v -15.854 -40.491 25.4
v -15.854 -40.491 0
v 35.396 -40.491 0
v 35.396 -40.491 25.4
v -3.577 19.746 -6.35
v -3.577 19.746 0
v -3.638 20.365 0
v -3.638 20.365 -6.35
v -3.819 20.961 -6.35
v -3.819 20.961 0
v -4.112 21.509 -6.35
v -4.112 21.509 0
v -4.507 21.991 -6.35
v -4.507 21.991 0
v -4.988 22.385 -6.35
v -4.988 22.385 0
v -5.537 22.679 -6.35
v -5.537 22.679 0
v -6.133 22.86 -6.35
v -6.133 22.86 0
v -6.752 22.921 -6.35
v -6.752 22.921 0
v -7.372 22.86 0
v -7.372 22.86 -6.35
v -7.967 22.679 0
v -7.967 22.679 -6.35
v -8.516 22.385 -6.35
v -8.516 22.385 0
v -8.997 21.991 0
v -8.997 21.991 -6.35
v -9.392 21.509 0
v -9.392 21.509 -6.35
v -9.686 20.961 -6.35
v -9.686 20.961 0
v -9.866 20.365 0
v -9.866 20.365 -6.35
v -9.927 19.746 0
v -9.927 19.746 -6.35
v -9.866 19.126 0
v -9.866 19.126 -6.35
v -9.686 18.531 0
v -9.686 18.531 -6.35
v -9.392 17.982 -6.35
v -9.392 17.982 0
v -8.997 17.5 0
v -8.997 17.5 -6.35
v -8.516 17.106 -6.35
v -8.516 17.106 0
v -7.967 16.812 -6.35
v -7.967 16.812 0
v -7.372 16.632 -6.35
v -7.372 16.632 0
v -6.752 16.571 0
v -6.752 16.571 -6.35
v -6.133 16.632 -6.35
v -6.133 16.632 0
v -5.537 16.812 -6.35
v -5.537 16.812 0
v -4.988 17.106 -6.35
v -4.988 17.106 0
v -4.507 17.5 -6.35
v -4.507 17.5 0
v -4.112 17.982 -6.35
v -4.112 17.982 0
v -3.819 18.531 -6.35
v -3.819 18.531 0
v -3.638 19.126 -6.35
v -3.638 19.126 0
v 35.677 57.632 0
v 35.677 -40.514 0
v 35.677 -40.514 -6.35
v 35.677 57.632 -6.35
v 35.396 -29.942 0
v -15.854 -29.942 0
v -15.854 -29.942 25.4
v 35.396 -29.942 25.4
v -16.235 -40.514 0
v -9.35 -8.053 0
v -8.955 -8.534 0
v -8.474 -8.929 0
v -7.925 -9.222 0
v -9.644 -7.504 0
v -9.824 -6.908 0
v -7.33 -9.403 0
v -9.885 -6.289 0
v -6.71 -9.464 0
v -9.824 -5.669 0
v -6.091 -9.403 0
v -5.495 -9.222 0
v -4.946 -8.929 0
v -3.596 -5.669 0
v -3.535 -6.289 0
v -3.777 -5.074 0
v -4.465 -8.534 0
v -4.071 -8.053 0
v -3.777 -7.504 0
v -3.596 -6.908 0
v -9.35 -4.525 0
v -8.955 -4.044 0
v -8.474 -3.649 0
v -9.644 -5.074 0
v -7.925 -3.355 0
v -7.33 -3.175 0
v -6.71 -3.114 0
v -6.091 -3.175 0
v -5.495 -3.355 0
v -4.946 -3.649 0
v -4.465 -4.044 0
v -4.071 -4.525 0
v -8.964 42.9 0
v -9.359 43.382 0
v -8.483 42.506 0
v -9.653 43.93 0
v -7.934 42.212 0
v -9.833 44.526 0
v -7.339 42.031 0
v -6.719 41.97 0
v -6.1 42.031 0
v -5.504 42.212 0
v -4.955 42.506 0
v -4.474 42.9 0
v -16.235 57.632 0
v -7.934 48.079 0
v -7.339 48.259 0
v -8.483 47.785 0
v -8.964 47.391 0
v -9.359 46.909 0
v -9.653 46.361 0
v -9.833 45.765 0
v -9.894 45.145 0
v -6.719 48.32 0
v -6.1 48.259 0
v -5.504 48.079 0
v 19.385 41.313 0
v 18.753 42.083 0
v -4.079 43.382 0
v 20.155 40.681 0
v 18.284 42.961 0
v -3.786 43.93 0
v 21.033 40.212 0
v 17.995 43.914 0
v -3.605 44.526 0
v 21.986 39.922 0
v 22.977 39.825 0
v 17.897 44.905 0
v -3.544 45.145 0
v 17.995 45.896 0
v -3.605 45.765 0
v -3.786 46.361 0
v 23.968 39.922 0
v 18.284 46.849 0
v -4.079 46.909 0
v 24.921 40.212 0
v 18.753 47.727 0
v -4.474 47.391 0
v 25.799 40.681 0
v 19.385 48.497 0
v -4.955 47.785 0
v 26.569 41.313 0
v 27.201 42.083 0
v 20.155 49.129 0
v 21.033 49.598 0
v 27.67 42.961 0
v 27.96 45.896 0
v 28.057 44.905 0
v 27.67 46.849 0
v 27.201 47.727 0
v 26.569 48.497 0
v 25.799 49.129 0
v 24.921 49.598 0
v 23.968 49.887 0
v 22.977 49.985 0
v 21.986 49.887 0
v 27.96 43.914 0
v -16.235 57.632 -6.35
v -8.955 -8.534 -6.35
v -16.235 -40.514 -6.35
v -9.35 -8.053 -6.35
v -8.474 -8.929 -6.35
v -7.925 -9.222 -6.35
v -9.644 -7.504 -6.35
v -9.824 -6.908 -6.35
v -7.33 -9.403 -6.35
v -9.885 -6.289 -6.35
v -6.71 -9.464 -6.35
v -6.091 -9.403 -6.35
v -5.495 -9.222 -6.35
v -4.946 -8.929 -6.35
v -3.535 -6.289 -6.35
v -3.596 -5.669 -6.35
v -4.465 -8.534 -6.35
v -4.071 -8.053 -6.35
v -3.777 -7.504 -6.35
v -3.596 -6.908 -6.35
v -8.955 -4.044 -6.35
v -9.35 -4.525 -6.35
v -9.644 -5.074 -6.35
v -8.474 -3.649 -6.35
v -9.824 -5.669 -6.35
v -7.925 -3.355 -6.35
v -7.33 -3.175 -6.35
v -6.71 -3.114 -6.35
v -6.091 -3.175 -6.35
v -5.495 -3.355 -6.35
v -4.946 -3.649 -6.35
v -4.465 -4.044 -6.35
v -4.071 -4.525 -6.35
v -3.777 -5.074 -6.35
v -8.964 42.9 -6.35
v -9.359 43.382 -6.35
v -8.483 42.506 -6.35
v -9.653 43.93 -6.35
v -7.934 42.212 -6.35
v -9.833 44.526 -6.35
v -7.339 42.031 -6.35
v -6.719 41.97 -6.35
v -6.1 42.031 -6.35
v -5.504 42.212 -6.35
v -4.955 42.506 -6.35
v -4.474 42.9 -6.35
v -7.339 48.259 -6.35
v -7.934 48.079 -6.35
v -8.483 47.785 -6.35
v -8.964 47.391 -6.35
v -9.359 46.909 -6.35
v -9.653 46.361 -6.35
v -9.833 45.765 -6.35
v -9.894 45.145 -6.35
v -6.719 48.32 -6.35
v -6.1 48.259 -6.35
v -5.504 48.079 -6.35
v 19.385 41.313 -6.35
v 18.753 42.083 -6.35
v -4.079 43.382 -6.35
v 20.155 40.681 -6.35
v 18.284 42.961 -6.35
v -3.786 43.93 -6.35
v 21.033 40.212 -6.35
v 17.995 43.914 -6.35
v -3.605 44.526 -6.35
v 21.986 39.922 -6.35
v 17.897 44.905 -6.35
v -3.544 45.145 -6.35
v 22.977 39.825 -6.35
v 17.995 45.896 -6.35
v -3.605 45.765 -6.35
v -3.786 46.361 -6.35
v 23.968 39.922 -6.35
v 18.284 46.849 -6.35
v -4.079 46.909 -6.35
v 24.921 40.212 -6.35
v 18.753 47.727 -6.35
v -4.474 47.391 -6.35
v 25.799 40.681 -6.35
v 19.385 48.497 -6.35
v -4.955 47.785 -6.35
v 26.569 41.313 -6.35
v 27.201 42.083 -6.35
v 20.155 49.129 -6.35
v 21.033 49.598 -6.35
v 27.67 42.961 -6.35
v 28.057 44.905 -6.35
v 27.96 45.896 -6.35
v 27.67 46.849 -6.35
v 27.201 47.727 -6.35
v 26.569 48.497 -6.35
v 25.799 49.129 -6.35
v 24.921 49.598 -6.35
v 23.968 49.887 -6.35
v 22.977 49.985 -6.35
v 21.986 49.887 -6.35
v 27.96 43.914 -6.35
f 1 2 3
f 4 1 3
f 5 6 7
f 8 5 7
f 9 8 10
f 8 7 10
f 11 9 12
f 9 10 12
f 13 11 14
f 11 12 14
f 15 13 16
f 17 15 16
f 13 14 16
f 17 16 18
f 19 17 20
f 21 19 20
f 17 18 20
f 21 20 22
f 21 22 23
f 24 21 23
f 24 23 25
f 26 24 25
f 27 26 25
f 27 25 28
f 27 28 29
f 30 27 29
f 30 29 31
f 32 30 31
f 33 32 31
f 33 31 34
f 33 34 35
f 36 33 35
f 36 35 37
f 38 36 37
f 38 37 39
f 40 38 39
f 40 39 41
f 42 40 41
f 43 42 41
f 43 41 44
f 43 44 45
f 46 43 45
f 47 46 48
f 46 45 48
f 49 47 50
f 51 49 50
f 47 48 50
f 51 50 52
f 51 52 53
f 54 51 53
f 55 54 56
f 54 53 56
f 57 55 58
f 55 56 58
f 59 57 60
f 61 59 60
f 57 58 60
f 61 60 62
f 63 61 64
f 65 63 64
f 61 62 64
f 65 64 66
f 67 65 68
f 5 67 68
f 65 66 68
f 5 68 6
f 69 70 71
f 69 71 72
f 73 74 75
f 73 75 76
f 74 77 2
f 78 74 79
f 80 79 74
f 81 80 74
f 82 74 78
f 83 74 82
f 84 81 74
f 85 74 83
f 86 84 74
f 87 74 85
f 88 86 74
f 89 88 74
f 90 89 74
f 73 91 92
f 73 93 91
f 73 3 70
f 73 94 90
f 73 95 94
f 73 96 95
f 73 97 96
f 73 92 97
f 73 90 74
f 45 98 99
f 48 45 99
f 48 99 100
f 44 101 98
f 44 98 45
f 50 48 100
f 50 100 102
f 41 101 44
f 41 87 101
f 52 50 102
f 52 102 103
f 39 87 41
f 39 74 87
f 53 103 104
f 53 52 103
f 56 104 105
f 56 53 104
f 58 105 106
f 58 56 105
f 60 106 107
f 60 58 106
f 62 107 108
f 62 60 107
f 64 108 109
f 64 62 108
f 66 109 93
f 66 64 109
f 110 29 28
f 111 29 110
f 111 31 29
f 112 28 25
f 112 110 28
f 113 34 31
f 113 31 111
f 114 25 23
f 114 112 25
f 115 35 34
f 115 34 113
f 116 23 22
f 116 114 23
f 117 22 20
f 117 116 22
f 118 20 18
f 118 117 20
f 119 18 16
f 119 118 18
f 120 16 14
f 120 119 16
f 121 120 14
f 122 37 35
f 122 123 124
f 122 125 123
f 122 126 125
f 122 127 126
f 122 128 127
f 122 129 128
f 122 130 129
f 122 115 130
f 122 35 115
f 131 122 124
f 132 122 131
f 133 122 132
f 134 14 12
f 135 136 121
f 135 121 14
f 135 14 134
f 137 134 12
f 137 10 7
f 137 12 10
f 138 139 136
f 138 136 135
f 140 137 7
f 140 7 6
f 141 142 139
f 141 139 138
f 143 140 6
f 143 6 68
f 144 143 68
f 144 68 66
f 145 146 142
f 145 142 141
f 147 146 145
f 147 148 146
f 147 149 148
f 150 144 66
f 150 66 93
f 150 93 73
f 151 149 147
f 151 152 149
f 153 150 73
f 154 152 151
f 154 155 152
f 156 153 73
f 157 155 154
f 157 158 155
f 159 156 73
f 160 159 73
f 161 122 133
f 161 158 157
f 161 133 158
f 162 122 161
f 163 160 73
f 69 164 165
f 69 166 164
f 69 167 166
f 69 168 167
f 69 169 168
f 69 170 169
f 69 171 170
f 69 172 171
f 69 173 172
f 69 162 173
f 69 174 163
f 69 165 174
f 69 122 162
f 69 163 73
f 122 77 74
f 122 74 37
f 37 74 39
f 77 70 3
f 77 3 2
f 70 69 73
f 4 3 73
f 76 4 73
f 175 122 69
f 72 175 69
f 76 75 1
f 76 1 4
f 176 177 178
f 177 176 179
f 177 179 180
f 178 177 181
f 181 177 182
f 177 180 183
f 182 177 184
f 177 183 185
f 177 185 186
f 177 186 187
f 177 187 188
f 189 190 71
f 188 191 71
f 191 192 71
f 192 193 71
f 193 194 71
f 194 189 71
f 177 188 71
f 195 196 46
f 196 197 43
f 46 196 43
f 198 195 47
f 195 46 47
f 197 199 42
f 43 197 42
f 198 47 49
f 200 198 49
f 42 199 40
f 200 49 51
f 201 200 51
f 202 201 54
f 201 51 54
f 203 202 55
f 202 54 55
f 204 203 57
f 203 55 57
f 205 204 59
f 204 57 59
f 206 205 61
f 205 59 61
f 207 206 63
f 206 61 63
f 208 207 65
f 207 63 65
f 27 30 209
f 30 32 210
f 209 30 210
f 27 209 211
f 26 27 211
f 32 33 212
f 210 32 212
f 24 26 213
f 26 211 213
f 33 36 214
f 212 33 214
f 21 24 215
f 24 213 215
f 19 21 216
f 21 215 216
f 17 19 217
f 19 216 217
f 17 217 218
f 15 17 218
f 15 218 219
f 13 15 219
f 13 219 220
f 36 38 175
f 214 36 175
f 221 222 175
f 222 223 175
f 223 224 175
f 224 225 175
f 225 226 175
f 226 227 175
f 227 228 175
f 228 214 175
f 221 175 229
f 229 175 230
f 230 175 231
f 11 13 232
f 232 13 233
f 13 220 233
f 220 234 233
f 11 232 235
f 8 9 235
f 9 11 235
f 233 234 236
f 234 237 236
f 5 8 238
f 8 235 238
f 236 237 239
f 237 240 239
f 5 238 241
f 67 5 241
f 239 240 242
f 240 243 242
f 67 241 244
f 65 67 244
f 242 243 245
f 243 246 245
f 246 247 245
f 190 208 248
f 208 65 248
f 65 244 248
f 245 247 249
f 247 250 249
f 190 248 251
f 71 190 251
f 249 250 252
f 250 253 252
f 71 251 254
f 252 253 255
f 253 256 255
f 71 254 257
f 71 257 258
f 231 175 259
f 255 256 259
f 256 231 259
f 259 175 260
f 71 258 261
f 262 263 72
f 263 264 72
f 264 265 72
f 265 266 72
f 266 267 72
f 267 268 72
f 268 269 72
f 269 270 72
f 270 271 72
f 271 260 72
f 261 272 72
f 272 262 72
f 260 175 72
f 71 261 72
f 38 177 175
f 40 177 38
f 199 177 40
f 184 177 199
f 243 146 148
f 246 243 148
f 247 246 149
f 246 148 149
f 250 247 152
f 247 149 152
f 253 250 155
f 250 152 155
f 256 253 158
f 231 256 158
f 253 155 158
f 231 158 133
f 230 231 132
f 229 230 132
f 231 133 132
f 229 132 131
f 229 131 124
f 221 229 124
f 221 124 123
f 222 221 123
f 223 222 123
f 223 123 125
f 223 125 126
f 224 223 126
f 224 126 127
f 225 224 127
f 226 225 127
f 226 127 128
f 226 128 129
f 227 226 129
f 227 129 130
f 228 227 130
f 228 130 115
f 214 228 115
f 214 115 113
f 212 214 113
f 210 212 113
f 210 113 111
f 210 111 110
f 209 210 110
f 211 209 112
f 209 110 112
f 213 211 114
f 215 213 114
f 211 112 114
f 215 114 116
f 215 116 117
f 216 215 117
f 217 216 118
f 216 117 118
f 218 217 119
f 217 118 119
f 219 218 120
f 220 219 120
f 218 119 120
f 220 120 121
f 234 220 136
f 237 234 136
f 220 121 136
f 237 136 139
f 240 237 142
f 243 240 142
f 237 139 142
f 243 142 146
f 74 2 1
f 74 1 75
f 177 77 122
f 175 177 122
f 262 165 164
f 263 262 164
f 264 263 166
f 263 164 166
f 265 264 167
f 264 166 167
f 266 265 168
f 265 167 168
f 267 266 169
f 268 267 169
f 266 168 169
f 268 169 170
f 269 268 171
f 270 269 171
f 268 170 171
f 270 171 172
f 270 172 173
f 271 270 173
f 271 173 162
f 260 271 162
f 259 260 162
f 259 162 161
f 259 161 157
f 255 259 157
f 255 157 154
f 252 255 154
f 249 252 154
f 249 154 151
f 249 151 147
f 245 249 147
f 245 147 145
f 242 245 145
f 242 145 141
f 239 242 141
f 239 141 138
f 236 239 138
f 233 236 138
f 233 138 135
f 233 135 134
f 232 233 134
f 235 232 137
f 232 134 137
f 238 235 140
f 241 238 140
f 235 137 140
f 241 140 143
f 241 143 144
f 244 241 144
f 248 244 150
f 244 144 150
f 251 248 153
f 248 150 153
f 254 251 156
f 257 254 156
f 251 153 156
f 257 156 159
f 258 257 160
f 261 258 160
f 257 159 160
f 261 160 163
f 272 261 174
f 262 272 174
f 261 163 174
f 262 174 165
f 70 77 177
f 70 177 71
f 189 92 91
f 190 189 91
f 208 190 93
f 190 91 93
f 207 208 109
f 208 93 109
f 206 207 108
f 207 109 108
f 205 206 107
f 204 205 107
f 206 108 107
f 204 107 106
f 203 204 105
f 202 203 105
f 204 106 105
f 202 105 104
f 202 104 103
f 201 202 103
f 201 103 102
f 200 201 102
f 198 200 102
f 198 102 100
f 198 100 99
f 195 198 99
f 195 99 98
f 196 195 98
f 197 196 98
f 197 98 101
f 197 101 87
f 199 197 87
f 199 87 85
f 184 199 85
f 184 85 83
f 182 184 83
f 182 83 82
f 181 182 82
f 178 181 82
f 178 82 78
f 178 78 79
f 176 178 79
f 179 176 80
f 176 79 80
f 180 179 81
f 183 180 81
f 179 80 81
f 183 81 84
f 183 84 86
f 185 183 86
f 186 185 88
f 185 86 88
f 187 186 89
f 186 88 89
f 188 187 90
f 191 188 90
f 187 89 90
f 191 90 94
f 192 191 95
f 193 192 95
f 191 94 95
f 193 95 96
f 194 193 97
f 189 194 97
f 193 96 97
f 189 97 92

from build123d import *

# Parameters (mm, degrees)
F1_W     = 51.249427
F1_H     = 10.54919
F2_DEPTH = 25.4
F0_W     = 51.912584
F0_H     = 98.145824
F3_DEPTH = 6.35
F4_R     = 3.175
F4_R_2   = 5.08
F5_DEPTH = 25.4


with BuildPart() as f2:
    # F1 (on Top) → F2 (new body)
    with BuildSketch(Plane.XY):
        with Locations((9.770837, -35.216718)):
            Rectangle(F1_W, F1_H)
    extrude(amount=F2_DEPTH)

    # F0 (on Top) → F3 (join)
    with BuildSketch(Plane.XY):
        with Locations((9.720873, 8.55908)):
            Rectangle(F0_W, F0_H)
    extrude(amount=-F3_DEPTH)

    # F4 (on face) → F5 (cut)
    with BuildSketch(Plane.XY):
        with Locations((-6.719237, 45.145492)):
            Circle(F4_R)
        with Locations((-6.752275, 19.745523)):
            Circle(F4_R)
        with Locations((-6.710419, -6.288796)):
            Circle(F4_R)
        with Locations((22.977165, 44.904832)):
            Circle(F4_R_2)
    extrude(amount=-F5_DEPTH, mode=Mode.SUBTRACT)


solid = f2.part
